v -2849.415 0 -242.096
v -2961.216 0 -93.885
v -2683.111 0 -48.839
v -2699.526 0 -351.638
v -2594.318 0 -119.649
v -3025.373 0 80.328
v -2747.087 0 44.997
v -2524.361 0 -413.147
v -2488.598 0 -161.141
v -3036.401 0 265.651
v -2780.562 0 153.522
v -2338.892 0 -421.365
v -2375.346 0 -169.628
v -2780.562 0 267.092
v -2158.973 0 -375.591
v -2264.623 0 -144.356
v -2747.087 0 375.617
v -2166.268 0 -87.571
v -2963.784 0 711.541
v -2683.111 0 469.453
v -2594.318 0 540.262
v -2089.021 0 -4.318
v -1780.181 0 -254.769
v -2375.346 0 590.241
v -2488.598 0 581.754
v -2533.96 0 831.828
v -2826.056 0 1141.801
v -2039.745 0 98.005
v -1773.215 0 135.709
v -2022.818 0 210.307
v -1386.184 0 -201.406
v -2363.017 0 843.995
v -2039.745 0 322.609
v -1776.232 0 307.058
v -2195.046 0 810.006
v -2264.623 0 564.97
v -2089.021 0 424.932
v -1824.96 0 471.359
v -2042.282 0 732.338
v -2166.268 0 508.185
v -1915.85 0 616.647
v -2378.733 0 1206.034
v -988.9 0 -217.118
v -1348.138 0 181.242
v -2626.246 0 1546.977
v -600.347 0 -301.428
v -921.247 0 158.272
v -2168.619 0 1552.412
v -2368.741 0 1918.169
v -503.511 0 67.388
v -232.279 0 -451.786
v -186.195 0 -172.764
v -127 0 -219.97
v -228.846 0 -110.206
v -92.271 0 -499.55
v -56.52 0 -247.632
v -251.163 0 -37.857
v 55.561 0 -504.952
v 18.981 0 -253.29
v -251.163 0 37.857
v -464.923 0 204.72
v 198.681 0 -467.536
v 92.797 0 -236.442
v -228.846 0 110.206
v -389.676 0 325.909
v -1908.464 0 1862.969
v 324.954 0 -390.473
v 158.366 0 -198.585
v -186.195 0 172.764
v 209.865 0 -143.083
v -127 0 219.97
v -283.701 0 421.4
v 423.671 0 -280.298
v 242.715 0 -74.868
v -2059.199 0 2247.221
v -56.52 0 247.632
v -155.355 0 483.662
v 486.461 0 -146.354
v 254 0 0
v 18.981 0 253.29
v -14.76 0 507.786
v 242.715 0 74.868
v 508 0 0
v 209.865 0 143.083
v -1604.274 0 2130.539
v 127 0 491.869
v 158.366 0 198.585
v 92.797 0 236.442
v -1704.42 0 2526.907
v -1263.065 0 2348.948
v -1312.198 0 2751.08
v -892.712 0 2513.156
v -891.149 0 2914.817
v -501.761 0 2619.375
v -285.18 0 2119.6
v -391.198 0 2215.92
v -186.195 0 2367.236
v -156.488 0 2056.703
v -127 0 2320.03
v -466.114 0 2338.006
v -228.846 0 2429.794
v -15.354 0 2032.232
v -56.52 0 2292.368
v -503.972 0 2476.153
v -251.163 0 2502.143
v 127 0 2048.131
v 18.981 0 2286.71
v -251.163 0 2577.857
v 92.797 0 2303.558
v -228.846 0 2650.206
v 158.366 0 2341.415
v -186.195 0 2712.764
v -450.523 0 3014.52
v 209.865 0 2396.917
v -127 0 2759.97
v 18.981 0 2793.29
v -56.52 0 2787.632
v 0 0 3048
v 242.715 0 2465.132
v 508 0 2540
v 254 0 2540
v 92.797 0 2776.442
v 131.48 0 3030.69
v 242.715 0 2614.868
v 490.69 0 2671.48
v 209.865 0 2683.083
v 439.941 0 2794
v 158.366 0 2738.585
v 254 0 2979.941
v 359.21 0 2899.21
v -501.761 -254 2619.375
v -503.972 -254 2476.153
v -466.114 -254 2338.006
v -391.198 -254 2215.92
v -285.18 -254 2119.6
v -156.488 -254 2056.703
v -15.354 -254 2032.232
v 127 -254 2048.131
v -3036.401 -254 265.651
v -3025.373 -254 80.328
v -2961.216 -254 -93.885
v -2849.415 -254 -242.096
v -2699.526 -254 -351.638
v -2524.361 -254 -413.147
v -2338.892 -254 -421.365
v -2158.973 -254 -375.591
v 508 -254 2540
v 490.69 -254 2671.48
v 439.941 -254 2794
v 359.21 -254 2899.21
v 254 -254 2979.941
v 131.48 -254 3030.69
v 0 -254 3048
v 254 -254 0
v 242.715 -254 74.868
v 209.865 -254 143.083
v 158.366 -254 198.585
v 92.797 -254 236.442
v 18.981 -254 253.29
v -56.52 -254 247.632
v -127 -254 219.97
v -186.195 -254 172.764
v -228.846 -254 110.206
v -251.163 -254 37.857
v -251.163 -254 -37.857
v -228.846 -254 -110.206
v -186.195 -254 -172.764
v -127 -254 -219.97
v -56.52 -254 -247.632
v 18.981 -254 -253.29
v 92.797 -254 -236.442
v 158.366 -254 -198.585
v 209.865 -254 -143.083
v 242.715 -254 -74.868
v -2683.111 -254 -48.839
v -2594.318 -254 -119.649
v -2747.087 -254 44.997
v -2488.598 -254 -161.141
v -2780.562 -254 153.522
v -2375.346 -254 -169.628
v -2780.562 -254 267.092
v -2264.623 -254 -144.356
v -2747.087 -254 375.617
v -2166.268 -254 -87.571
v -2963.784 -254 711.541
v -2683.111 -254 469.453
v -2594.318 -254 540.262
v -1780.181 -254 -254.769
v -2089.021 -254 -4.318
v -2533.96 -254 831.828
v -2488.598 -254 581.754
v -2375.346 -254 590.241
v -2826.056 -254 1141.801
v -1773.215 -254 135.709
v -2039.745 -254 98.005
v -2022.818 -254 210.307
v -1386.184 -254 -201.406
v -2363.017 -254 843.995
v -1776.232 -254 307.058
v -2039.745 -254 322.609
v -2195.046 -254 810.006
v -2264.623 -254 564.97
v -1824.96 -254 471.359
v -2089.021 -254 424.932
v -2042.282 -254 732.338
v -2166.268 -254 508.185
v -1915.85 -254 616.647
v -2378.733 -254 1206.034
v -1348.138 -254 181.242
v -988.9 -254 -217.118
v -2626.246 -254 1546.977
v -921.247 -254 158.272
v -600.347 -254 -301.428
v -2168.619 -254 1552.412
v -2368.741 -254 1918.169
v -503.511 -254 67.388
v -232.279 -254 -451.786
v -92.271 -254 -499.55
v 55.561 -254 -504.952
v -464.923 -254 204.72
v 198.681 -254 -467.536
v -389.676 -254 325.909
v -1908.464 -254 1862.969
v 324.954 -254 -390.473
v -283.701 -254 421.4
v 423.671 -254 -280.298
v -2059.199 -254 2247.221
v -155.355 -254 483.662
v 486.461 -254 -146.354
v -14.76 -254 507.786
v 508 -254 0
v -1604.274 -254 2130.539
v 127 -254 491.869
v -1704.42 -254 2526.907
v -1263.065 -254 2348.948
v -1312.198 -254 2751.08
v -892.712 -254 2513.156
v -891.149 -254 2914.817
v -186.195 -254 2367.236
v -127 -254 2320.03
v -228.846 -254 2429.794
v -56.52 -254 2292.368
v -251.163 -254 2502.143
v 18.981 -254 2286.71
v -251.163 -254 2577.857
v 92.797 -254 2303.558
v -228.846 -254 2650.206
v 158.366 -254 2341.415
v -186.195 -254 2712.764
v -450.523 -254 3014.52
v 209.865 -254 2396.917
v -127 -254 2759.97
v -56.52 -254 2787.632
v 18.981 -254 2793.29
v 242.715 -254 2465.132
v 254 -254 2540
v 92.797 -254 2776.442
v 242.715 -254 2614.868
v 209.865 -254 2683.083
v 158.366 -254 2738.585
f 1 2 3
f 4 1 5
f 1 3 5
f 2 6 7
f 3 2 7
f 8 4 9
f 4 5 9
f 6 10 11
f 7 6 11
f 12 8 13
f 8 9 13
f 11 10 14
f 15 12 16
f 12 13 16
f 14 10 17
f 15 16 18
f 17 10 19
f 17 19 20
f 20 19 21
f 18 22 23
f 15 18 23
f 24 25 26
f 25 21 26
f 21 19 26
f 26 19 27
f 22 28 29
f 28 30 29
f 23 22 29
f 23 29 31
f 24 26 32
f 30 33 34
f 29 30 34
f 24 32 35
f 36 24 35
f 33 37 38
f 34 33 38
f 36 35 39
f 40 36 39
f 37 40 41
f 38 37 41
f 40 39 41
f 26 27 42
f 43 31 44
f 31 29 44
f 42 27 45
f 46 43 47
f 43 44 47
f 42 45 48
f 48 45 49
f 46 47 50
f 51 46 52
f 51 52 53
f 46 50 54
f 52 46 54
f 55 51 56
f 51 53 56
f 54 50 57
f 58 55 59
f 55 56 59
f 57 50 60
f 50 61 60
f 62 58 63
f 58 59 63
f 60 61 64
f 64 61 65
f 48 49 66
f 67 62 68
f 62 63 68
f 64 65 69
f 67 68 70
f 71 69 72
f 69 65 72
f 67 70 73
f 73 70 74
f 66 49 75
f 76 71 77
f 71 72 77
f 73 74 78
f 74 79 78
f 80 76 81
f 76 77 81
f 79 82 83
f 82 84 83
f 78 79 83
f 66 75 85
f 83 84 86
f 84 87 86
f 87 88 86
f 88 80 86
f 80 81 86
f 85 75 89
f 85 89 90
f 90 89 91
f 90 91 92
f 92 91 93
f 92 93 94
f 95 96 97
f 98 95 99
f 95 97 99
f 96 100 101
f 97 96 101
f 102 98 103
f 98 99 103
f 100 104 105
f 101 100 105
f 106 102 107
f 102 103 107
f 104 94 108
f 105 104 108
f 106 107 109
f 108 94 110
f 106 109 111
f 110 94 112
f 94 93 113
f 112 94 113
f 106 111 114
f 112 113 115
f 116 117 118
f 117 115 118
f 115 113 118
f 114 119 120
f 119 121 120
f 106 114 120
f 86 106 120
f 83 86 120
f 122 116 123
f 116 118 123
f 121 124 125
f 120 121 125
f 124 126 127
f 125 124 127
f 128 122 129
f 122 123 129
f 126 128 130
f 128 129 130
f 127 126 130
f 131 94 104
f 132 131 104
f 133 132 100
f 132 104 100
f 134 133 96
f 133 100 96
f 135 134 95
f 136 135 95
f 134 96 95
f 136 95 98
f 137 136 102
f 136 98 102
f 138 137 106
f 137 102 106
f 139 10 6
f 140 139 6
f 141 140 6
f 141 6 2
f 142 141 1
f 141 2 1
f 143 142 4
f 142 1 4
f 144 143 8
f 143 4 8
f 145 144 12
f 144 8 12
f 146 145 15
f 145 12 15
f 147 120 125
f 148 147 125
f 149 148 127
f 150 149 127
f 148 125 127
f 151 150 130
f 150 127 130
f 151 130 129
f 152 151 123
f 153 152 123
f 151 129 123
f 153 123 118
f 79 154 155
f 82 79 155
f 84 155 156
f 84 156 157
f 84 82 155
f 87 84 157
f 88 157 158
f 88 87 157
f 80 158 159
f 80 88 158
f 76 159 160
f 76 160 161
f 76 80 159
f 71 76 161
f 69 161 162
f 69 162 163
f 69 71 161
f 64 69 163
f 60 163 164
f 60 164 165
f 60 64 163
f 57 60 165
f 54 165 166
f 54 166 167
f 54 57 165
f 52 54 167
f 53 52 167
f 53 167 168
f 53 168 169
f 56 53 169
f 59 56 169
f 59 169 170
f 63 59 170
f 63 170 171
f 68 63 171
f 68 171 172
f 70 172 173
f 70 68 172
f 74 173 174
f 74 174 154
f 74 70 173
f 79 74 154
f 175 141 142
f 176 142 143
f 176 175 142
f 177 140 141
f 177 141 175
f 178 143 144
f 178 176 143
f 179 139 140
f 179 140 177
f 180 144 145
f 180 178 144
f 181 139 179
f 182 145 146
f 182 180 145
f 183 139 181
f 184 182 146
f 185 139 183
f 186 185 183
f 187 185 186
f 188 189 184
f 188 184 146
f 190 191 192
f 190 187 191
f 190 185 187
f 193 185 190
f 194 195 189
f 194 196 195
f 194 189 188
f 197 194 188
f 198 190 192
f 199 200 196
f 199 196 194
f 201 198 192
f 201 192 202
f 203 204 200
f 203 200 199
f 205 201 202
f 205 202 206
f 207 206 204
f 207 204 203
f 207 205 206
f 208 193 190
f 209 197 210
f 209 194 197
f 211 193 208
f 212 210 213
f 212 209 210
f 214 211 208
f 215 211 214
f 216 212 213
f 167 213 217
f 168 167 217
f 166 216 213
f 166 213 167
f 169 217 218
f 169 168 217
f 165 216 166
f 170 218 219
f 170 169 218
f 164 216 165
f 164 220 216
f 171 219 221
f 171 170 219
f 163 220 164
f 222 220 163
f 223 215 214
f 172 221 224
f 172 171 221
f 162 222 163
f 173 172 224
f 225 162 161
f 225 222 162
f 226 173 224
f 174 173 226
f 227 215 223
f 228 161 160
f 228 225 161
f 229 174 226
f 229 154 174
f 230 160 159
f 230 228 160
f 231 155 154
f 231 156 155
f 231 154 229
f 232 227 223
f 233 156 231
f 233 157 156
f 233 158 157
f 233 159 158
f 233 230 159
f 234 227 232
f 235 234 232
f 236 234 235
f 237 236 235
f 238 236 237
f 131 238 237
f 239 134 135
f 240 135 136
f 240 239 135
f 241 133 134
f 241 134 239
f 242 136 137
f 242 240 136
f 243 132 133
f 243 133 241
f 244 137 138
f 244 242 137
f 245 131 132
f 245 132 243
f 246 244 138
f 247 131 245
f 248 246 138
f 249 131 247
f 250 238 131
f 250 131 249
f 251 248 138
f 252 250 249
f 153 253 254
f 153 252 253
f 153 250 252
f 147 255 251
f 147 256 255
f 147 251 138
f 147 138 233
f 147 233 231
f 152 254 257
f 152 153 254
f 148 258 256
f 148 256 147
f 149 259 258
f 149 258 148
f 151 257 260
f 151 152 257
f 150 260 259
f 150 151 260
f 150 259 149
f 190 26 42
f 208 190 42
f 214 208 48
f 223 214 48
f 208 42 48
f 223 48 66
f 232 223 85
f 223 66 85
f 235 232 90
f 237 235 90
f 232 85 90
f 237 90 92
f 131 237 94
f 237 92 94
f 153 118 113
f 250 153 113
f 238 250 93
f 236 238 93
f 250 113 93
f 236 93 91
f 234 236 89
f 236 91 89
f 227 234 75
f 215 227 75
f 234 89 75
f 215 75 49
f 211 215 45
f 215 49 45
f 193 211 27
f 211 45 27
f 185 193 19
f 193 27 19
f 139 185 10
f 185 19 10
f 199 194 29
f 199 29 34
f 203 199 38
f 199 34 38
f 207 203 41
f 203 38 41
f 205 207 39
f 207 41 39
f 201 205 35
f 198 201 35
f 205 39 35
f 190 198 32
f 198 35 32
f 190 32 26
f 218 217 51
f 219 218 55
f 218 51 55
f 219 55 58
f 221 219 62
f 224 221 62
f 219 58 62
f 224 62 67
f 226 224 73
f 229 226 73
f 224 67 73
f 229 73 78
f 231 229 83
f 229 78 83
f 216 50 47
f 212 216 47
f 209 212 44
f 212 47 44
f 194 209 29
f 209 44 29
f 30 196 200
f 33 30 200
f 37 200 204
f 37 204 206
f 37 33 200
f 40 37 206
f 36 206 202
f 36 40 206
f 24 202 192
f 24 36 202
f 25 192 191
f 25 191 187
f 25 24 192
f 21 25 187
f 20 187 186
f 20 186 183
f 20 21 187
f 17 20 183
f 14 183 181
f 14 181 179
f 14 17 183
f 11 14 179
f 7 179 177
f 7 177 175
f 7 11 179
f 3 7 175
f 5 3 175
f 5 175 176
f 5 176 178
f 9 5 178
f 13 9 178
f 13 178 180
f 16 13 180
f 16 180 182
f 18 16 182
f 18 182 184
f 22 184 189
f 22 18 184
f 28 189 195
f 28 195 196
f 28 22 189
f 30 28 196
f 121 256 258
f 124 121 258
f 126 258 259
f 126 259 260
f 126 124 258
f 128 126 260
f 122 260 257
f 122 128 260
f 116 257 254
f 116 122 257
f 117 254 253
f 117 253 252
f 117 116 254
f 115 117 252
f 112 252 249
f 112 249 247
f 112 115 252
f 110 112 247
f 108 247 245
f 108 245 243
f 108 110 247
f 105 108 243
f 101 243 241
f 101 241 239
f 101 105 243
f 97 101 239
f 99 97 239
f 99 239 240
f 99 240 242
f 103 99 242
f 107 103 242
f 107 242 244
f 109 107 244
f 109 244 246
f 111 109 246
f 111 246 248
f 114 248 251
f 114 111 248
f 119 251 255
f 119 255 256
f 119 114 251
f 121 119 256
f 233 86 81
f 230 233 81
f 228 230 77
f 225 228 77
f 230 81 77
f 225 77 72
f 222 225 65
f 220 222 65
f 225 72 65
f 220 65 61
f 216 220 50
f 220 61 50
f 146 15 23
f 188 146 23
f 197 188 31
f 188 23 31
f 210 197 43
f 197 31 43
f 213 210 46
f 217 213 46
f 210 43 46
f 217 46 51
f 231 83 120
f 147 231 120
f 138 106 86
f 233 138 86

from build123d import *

# Parameters (mm, degrees)
F0_R     = 381
F0_R_2   = 254
F1_DEPTH = 254


with BuildPart() as f1:
    # F0 (on Front) → F1 (new body)
    with BuildSketch(Plane.XZ):
        with BuildLine():
            ThreePointArc((-2158.973337, -375.590953), (-1187.199374, -200.608411), (-232.278772, -451.78598))
            ThreePointArc((-232.278772, -451.78598), (264.63785, -433.625193), (508, 0))
            Line((508, 0), (508, 2540))
            ThreePointArc((508, 2540), (359.210245, 2899.210245), (0, 3048))
            ThreePointArc((0, 3048), (-2059.198953, 2247.221323), (-3036.40144, 265.650704))
            ThreePointArc((-3036.40144, 265.650704), (-2778.495175, -302.374253), (-2158.973337, -375.590953))
        make_face()
        with Locations((-2403.817806, 210.306807)):
            Circle(F0_R, mode=Mode.SUBTRACT)
        Circle(F0_R_2, mode=Mode.SUBTRACT)
        with BuildLine():
            ThreePointArc((127, 491.868885), (-283.700841, 421.399849), (-503.510599, 67.387511))
            ThreePointArc((-503.510599, 67.387511), (-1134.231421, 178.324417), (-1773.214755, 135.709277))
            ThreePointArc((-1773.214755, 135.709277), (-1975.144838, 678.777176), (-2533.95972, 831.827589))
            ThreePointArc((-2533.95972, 831.827589), (-1761.457001, 2002.537948), (-501.76051, 2619.375))
            ThreePointArc((-501.76051, 2619.375), (-341.601016, 2164.004327), (127, 2048.131115))
            Line((127, 2048.131115), (127, 491.868885))
        make_face(mode=Mode.SUBTRACT)
        with Locations((0, 2540)):
            Circle(F0_R_2, mode=Mode.SUBTRACT)
    extrude(amount=F1_DEPTH)


solid = f1.part
